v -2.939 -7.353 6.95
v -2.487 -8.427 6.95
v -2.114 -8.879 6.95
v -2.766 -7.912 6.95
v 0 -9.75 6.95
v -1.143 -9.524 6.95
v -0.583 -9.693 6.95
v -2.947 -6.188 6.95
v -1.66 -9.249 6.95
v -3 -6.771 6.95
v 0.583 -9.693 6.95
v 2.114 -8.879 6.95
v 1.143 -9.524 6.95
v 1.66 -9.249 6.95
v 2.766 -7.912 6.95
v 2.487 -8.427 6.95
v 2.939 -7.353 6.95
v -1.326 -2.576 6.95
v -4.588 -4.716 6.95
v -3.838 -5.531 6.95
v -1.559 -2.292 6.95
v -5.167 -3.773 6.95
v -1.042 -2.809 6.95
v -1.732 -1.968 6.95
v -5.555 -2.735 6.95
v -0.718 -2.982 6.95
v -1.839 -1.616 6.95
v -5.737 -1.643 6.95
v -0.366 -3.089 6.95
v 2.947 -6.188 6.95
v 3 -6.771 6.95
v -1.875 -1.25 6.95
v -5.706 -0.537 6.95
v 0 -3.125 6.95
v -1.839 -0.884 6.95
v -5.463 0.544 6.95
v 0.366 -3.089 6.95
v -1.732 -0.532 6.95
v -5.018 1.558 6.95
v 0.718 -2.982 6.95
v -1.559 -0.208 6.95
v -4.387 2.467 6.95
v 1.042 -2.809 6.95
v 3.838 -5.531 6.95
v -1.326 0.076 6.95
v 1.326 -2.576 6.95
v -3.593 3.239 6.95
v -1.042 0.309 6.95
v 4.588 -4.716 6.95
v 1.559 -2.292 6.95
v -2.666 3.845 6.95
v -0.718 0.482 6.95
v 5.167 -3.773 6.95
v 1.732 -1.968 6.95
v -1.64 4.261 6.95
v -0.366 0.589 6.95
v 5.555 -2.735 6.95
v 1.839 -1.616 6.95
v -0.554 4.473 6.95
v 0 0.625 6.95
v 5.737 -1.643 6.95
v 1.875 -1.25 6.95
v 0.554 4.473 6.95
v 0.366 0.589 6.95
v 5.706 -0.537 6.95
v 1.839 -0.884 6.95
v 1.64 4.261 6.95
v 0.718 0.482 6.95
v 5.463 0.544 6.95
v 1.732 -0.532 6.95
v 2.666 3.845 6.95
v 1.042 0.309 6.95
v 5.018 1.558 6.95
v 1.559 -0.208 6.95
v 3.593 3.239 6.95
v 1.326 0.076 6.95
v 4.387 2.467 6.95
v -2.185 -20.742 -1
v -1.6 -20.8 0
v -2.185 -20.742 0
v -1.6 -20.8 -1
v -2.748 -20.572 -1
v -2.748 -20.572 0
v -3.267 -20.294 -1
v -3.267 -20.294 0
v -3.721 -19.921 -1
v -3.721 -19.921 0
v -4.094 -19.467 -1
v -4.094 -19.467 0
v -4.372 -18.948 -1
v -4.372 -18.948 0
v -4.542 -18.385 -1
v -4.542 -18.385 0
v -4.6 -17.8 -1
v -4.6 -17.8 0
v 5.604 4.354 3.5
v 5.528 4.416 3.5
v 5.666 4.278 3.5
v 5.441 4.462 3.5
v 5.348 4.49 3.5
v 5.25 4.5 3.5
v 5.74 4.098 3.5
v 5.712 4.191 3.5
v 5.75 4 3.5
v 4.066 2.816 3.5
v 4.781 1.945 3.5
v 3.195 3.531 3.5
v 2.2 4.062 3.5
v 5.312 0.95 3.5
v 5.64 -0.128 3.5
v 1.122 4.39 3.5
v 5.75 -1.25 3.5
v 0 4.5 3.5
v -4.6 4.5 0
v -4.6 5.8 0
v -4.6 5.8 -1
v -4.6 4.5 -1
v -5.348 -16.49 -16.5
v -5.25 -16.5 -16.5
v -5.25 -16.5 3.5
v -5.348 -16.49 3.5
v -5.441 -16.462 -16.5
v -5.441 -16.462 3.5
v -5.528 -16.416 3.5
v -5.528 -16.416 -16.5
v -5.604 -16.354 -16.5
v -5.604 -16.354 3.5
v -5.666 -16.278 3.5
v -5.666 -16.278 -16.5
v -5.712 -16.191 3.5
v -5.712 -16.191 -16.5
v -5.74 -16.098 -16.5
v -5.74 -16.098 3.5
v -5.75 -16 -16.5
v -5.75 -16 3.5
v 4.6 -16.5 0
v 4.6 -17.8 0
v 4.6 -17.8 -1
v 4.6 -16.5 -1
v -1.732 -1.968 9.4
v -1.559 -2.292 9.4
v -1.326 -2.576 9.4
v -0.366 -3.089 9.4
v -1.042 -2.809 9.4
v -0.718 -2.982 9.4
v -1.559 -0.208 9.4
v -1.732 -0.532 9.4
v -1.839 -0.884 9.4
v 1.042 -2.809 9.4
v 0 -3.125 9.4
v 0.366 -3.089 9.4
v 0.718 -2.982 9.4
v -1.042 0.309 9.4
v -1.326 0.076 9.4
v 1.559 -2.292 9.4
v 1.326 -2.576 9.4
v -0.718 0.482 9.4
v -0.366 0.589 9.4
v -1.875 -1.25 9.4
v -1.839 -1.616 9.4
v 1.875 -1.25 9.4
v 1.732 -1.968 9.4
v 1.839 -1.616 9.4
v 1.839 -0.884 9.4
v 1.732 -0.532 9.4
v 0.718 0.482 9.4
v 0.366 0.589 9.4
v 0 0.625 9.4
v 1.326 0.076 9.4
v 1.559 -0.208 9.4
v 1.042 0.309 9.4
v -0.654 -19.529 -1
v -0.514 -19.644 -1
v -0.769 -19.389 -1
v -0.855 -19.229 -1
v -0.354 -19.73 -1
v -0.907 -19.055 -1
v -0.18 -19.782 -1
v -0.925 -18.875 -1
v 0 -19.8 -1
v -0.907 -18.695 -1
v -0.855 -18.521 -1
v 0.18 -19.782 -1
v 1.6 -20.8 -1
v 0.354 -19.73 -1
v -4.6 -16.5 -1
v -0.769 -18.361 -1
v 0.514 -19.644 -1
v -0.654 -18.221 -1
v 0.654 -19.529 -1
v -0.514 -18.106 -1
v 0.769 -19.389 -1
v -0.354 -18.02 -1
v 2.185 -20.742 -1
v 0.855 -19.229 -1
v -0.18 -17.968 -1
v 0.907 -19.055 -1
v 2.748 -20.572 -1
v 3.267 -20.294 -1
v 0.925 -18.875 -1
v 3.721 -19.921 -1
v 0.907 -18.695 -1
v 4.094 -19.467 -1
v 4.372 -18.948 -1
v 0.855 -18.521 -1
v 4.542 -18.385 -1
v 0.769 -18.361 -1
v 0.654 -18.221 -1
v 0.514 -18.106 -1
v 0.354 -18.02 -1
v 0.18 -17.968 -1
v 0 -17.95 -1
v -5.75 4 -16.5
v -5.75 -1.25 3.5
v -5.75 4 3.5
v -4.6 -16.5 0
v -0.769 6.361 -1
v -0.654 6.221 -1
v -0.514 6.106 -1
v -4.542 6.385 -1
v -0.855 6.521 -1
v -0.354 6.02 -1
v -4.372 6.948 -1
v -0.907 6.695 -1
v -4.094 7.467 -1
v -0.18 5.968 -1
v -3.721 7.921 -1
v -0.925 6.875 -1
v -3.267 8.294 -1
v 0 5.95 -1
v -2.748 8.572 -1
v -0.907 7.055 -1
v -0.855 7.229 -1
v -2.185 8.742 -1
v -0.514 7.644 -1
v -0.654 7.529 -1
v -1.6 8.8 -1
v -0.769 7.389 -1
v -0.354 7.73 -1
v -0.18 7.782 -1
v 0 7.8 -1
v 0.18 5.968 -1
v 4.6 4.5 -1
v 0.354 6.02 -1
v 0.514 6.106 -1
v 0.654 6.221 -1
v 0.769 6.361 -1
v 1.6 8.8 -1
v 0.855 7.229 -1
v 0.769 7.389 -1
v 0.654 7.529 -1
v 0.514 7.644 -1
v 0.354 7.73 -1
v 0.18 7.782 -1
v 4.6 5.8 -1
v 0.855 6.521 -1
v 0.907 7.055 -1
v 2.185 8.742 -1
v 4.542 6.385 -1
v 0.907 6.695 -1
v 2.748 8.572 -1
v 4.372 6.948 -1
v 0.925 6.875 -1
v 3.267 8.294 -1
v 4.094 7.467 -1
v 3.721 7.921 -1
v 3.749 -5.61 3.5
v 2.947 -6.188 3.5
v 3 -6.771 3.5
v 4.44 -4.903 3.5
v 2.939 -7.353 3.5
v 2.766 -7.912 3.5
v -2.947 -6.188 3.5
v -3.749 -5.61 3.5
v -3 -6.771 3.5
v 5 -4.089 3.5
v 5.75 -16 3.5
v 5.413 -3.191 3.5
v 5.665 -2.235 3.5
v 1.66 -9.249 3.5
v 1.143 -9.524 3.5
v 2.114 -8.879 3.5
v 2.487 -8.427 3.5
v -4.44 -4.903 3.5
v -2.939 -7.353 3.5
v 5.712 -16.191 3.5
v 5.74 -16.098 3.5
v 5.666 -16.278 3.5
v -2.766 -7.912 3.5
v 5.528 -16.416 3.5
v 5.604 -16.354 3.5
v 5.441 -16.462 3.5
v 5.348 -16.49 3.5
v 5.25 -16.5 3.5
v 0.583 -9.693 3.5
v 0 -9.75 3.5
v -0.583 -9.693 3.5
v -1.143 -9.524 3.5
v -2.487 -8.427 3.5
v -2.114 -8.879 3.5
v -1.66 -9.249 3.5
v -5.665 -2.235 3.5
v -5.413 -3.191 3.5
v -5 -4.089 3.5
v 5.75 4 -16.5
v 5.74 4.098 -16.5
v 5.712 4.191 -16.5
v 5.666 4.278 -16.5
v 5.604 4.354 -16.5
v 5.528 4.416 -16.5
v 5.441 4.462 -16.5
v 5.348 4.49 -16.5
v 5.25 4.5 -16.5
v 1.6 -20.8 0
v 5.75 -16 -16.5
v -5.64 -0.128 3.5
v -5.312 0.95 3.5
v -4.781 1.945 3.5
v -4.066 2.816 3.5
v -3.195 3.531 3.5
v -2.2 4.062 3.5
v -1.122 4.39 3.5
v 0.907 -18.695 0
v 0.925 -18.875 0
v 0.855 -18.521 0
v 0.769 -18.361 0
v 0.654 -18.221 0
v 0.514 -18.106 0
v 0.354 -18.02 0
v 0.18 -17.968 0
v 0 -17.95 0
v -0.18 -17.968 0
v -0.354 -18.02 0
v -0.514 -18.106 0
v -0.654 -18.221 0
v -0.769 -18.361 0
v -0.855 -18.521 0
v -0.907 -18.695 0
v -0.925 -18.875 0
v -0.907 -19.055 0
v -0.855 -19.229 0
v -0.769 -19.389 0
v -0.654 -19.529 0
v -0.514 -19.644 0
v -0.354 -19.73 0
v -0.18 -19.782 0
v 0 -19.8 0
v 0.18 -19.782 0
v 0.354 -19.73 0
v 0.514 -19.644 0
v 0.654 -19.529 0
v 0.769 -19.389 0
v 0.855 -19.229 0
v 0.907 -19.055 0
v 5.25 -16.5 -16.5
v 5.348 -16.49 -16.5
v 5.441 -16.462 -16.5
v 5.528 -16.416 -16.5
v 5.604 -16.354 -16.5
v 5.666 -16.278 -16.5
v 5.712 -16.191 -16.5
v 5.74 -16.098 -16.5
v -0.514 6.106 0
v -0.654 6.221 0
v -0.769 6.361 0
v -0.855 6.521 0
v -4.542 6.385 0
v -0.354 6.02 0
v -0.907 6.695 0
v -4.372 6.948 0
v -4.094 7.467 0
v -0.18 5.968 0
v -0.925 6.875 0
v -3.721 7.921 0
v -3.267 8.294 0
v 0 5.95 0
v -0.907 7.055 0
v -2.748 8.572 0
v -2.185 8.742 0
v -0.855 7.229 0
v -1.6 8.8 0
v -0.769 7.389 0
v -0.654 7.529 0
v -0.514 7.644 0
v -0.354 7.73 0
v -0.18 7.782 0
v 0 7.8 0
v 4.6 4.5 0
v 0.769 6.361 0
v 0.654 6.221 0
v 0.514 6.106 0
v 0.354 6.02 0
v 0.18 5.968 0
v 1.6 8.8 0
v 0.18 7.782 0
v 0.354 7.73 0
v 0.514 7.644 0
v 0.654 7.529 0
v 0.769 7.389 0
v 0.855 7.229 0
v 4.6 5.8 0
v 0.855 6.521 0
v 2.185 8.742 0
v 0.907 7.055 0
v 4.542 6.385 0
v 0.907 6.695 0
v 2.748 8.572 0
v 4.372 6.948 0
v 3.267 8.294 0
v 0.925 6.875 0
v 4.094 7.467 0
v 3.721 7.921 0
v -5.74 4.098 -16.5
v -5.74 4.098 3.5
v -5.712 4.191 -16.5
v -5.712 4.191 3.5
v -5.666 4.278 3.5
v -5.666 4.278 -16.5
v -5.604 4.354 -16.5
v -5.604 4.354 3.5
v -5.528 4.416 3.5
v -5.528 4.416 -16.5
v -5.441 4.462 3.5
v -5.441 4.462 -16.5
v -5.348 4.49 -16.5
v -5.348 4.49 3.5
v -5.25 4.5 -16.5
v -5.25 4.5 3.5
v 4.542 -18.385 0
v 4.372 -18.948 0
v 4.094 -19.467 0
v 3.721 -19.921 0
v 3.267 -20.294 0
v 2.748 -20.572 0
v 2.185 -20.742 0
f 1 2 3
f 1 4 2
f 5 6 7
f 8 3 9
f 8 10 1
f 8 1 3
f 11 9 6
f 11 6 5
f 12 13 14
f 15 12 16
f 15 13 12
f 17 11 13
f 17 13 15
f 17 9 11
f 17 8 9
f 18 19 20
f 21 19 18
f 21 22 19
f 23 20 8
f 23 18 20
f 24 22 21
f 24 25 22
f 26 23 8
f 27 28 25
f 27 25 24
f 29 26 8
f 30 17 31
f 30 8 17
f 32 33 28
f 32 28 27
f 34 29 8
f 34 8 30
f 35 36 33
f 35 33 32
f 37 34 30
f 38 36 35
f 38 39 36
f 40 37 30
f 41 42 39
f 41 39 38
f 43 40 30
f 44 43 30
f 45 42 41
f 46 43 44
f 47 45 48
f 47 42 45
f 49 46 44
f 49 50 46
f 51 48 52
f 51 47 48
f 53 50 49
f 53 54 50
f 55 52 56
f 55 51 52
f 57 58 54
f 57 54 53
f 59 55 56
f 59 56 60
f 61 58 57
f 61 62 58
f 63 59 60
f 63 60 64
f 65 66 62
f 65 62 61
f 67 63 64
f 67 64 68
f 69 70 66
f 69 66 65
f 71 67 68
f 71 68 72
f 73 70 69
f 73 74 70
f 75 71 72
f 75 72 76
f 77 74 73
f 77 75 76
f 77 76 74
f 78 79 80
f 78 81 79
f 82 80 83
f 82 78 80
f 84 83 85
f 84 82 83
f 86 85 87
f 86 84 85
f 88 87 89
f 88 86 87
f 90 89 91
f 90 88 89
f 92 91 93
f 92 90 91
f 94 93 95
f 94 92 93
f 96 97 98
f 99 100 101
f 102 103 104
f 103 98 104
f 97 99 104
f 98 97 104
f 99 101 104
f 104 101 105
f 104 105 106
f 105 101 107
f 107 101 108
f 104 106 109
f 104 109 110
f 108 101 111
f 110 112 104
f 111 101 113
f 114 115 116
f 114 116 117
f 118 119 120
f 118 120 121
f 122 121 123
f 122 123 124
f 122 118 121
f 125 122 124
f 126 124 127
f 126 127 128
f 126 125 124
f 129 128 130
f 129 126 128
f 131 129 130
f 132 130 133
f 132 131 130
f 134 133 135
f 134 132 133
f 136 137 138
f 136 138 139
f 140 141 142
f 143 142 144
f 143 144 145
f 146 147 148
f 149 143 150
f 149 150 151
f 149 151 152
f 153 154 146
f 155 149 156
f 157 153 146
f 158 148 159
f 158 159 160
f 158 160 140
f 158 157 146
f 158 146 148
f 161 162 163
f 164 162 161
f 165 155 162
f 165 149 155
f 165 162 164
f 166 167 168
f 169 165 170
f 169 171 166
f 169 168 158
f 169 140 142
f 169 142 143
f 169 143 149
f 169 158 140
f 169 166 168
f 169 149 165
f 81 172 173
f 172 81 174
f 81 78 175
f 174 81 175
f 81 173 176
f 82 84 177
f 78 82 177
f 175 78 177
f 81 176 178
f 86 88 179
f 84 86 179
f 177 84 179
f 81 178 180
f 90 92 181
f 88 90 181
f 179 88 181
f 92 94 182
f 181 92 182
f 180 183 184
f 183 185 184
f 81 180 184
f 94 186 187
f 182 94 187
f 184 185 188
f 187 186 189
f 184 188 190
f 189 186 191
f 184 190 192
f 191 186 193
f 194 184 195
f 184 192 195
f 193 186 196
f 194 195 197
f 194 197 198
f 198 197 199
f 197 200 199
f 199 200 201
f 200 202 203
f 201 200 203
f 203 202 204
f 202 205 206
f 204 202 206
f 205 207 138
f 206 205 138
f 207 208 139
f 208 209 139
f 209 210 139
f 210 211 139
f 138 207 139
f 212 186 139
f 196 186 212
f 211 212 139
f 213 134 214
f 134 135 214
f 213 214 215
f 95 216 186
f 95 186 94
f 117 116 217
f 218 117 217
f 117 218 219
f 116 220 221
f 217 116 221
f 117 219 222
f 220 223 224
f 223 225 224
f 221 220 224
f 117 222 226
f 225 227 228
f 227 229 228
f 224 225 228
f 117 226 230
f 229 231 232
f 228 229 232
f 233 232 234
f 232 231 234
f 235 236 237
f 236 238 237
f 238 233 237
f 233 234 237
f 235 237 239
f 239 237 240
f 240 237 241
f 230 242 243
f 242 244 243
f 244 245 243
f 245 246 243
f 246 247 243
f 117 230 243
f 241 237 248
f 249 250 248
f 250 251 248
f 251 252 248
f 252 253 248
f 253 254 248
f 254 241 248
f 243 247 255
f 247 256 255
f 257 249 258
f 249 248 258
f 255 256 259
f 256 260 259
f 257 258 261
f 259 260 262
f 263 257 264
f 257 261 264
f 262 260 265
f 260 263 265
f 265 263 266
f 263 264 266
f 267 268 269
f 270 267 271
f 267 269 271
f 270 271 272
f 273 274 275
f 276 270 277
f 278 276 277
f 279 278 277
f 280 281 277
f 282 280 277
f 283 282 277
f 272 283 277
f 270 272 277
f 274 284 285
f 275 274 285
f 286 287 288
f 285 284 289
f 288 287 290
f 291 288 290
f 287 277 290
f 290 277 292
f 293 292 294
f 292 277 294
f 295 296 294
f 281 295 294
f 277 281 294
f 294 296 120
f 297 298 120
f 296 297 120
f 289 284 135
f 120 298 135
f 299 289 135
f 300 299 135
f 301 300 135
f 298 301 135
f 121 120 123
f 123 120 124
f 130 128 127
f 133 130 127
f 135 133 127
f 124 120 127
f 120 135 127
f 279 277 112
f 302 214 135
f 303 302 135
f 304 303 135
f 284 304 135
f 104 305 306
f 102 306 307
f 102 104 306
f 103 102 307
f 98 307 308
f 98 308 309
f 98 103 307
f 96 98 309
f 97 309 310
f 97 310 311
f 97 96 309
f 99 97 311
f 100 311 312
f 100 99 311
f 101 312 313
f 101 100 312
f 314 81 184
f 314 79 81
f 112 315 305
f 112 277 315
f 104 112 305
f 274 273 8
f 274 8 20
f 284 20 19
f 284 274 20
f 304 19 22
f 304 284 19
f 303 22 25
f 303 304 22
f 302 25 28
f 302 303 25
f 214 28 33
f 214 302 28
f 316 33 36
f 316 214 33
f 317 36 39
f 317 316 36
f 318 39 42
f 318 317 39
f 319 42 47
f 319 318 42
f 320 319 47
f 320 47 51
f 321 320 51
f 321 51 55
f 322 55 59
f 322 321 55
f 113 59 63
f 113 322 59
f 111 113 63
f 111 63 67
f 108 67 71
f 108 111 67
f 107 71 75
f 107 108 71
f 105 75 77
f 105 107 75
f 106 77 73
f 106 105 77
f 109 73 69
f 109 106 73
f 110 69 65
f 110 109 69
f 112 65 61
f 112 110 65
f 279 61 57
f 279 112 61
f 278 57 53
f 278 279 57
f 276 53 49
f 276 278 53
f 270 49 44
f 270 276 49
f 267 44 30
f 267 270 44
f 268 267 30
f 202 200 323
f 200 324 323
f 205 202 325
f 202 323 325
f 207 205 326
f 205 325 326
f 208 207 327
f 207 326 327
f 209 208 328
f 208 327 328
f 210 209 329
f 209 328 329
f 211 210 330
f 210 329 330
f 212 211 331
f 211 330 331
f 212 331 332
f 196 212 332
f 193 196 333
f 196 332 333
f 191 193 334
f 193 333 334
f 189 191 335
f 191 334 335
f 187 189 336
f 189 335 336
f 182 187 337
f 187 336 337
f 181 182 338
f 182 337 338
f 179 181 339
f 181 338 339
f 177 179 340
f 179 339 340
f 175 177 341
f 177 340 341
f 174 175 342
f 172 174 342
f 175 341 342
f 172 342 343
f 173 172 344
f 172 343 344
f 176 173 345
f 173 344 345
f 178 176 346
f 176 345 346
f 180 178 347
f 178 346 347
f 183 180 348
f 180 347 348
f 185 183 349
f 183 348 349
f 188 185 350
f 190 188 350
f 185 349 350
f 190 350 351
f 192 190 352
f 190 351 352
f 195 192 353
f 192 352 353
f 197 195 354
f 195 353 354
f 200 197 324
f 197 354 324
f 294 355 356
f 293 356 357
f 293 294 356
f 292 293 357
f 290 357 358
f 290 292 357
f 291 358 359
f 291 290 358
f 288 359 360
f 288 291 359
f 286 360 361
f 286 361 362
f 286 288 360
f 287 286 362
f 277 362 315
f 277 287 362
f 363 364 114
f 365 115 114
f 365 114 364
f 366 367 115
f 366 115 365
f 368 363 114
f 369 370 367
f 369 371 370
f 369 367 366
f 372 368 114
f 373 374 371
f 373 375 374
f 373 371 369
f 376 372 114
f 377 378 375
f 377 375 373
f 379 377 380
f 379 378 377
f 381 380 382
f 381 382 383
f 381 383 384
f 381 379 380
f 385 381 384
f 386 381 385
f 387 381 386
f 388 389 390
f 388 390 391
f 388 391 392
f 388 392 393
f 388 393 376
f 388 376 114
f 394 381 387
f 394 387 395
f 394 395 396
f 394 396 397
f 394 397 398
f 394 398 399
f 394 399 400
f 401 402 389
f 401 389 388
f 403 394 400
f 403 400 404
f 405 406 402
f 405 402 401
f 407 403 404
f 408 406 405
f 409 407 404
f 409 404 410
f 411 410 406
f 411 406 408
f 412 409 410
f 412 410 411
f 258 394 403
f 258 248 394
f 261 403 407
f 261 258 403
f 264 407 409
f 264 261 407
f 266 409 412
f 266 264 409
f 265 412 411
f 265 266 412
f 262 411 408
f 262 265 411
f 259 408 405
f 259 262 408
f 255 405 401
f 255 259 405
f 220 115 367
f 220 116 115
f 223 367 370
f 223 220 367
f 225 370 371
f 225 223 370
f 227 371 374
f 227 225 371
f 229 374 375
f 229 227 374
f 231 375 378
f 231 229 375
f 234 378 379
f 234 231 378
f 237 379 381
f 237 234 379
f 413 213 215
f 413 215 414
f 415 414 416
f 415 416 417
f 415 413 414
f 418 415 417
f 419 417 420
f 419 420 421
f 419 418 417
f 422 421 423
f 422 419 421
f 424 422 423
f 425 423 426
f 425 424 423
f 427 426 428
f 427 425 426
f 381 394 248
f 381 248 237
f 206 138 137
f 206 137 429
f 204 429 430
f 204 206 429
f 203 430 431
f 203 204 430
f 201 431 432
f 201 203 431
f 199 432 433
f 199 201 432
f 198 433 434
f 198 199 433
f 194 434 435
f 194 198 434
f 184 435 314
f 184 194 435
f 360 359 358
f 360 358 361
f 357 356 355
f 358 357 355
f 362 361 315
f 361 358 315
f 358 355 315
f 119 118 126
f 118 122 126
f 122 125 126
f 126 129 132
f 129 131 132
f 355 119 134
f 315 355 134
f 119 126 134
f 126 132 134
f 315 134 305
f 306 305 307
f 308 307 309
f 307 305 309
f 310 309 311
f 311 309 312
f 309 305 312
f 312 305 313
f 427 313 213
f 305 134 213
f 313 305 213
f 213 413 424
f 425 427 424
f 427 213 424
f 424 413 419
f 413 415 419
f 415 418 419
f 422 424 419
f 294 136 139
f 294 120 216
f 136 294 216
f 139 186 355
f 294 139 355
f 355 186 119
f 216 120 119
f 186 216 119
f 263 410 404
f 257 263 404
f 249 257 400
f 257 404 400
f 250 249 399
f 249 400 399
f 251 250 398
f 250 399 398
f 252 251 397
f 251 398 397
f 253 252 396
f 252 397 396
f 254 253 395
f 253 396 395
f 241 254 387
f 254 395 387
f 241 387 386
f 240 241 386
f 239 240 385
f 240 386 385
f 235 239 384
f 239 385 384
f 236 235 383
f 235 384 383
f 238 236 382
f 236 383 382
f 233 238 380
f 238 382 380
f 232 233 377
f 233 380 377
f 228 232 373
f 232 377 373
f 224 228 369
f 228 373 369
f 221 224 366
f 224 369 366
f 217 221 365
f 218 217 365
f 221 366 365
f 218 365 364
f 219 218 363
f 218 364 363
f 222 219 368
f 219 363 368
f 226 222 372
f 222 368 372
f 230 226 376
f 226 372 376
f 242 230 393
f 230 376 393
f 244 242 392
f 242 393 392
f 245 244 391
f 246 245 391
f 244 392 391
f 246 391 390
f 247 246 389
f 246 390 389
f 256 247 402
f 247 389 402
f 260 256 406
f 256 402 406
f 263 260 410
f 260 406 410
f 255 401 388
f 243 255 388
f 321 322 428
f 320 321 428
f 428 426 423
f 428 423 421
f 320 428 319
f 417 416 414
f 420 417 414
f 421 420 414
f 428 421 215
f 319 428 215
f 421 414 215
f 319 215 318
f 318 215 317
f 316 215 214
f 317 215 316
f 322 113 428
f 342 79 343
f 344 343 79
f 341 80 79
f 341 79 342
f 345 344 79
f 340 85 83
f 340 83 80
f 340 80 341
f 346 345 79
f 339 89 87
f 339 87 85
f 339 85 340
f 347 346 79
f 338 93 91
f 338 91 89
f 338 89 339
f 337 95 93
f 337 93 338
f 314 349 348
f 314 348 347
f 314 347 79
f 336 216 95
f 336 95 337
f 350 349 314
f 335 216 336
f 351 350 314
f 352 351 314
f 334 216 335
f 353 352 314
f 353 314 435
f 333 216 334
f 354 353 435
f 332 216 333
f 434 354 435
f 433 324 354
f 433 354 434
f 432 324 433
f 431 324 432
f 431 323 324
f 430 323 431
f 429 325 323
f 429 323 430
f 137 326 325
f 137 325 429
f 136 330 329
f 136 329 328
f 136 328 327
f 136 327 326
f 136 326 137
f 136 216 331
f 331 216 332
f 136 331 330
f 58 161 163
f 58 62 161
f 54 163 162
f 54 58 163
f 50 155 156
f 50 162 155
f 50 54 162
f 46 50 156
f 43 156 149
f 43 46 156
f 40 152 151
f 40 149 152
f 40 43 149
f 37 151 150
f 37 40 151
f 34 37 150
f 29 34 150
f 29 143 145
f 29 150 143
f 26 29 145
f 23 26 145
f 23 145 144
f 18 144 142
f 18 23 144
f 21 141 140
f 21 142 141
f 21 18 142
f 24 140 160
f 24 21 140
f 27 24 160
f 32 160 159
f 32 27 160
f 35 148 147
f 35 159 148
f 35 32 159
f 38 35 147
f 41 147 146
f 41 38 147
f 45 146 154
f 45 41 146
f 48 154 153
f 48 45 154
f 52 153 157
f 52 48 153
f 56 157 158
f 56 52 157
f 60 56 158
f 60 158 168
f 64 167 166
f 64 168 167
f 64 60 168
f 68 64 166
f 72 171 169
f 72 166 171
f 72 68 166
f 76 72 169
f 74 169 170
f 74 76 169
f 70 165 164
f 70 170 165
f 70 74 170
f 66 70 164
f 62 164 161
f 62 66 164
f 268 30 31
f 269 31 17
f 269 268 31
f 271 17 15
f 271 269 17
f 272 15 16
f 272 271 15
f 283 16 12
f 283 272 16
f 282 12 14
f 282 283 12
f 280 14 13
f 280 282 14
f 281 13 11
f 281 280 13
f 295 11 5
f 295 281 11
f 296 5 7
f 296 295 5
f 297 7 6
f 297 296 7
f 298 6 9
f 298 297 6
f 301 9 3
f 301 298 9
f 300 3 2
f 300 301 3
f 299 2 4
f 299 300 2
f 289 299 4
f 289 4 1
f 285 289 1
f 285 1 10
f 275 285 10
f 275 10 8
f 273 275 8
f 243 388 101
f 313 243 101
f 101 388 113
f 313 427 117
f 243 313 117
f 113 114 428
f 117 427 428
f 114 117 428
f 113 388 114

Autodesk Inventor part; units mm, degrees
ref_plane "YZ Plane" through (0, 0, 0) normal (1, 0, 0) x (0, 1, 0)
ref_plane "XZ Plane" through (0, 0, 0) normal (0, 1, 0) x (-1, 0, 0)
ref_plane "XY Plane" through (0, 0, 0) normal (0, 0, 1) x (1, 0, 0)
sketch "Sketch1" plane through (0, 0, 0) normal (1, 0, 0) x (0, 1, 0)
  line L0 (0, -20.5) -> (0, 7.5) projected
  line L1 (-20.7, 0) -> (8.7, 0) projected
  line L2 (4.5, 3.5) -> (-16.5, 3.5)
  line L3 (-16.5, 3.5) -> (-16.5, -16.5)
  line L4 (-16.5, -16.5) -> (4.5, -16.5)
  line L5 (4.5, -16.5) -> (4.5, 3.5)
  point P0 (0, 0)
  dimension "d0" = 4.5
  dimension "d1" = 20
  dimension "d2" = 21
  dimension "d3" = 3.5
extrude "Extrusion1" add sketch "Sketch1" along normal mid plane 11.5
sketch "Sketch2" plane through (0, 0, 0) normal (0, 0, 1) x (1, 0, 0)
  line L0 (5.75, 4.5) -> (-5.75, 4.5) projected
  line L1 (-5.75, 4.5) -> (5.75, 4.5) projected
  line L2 (-5.75, -16.5) -> (5.75, -16.5) projected
  line L3 (-5.75, -16.5) -> (5.75, -16.5) projected
  line L4 (-5.75, 4.5) -> (5.75, 4.5)
  line L5 (4.6, 8.8) -> (-4.6, 8.8)
  line L6 (-5.75, -16.5) -> (5.75, -16.5)
  circle A0 centre (0, 6.875) radius 0.925
  line L7 (0, -26.72) -> (0, 14.72) projected
  line L8 (-5.75, -16.5) -> (-5.75, 4.5) projected
  line L9 (5.75, 4.5) -> (5.75, -16.5) projected
  line L10 (-5.75, -6) -> (5.75, -6) construction
  circle A1 centre (0, -18.875) radius 0.925
  line L11 (-4.6, 8.8) -> (-4.6, 4.5)
  line L12 (4.6, 8.8) -> (4.6, 4.5)
  line L13 (-4.6, -16.5) -> (-4.6, -20.8)
  line L14 (-4.6, -20.8) -> (4.6, -20.8)
  line L15 (4.6, -20.8) -> (4.6, -16.5)
  point P0 (0, 0)
  point P1 (0, 7.8)
  dimension "d7" = 1.85
  dimension "d8" = 3.3
  dimension "d12" = 9.2
  dimension "d13" = 4.3
extrude "Extrusion2" add sketch "Sketch2" against normal blind 1 contours L0 L7 A0 L5 L12 | L0 L11 L5 L7 A0 | L15 L14 L7 A1 L2 | L7 A1 L14 L13 L2
fillet "Fillet1" radius 3 4 edges at (4.6, 8.8, -0.5) (-4.6, 8.8, -0.5) (-4.6, -20.8, -0.5) (4.6, -20.8, -0.5)
fillet "Fillet2" radius 0.5 4 edges at (5.75, -16.5, -6.5) (-5.75, -16.5, -6.5) (-5.75, 4.5, -6.5) (5.75, 4.5, -6.5)
sketch "Sketch3" plane through (-5.25, 4.5, 3.5) normal (0, 0, 1) x (1, 0, 0)
  line L0 (11, -0.5) -> (11, -20.5) projected
  line L1 (5.25, -5.75) -> (5.25, -11.25) construction
  circle A0 centre (5.25, -11.25) radius 3
  line L2 (10.5, 0) -> (0, 0) projected
  line L3 (-0.5, -20.5) -> (-0.5, -0.5) projected
  circle A1 centre (5.25, -5.75) radius 5.75
  point P0 (5.25, -4.5)
  dimension "d16" = 6
  dimension "d17" = 5.5
extrude "Extrusion3" add sketch "Sketch3" along normal blind 3.45
sketch "Sketch4" plane through (-5.25, 4.5, 6.95) normal (0, 0, 1) x (1, 0, 0)
  arc A0 (8.1968, -10.6875) -> (2.3032, -10.6875) centre (5.25, -5.75) ccw projected
  circle A1 centre (5.25, -5.75) radius 1.875
  point P0 (5.25, -4.5)
  dimension "d20" = 3.75
extrude "Extrusion4" add sketch "Sketch4" along normal blind 2.45
properties part number "empty"
